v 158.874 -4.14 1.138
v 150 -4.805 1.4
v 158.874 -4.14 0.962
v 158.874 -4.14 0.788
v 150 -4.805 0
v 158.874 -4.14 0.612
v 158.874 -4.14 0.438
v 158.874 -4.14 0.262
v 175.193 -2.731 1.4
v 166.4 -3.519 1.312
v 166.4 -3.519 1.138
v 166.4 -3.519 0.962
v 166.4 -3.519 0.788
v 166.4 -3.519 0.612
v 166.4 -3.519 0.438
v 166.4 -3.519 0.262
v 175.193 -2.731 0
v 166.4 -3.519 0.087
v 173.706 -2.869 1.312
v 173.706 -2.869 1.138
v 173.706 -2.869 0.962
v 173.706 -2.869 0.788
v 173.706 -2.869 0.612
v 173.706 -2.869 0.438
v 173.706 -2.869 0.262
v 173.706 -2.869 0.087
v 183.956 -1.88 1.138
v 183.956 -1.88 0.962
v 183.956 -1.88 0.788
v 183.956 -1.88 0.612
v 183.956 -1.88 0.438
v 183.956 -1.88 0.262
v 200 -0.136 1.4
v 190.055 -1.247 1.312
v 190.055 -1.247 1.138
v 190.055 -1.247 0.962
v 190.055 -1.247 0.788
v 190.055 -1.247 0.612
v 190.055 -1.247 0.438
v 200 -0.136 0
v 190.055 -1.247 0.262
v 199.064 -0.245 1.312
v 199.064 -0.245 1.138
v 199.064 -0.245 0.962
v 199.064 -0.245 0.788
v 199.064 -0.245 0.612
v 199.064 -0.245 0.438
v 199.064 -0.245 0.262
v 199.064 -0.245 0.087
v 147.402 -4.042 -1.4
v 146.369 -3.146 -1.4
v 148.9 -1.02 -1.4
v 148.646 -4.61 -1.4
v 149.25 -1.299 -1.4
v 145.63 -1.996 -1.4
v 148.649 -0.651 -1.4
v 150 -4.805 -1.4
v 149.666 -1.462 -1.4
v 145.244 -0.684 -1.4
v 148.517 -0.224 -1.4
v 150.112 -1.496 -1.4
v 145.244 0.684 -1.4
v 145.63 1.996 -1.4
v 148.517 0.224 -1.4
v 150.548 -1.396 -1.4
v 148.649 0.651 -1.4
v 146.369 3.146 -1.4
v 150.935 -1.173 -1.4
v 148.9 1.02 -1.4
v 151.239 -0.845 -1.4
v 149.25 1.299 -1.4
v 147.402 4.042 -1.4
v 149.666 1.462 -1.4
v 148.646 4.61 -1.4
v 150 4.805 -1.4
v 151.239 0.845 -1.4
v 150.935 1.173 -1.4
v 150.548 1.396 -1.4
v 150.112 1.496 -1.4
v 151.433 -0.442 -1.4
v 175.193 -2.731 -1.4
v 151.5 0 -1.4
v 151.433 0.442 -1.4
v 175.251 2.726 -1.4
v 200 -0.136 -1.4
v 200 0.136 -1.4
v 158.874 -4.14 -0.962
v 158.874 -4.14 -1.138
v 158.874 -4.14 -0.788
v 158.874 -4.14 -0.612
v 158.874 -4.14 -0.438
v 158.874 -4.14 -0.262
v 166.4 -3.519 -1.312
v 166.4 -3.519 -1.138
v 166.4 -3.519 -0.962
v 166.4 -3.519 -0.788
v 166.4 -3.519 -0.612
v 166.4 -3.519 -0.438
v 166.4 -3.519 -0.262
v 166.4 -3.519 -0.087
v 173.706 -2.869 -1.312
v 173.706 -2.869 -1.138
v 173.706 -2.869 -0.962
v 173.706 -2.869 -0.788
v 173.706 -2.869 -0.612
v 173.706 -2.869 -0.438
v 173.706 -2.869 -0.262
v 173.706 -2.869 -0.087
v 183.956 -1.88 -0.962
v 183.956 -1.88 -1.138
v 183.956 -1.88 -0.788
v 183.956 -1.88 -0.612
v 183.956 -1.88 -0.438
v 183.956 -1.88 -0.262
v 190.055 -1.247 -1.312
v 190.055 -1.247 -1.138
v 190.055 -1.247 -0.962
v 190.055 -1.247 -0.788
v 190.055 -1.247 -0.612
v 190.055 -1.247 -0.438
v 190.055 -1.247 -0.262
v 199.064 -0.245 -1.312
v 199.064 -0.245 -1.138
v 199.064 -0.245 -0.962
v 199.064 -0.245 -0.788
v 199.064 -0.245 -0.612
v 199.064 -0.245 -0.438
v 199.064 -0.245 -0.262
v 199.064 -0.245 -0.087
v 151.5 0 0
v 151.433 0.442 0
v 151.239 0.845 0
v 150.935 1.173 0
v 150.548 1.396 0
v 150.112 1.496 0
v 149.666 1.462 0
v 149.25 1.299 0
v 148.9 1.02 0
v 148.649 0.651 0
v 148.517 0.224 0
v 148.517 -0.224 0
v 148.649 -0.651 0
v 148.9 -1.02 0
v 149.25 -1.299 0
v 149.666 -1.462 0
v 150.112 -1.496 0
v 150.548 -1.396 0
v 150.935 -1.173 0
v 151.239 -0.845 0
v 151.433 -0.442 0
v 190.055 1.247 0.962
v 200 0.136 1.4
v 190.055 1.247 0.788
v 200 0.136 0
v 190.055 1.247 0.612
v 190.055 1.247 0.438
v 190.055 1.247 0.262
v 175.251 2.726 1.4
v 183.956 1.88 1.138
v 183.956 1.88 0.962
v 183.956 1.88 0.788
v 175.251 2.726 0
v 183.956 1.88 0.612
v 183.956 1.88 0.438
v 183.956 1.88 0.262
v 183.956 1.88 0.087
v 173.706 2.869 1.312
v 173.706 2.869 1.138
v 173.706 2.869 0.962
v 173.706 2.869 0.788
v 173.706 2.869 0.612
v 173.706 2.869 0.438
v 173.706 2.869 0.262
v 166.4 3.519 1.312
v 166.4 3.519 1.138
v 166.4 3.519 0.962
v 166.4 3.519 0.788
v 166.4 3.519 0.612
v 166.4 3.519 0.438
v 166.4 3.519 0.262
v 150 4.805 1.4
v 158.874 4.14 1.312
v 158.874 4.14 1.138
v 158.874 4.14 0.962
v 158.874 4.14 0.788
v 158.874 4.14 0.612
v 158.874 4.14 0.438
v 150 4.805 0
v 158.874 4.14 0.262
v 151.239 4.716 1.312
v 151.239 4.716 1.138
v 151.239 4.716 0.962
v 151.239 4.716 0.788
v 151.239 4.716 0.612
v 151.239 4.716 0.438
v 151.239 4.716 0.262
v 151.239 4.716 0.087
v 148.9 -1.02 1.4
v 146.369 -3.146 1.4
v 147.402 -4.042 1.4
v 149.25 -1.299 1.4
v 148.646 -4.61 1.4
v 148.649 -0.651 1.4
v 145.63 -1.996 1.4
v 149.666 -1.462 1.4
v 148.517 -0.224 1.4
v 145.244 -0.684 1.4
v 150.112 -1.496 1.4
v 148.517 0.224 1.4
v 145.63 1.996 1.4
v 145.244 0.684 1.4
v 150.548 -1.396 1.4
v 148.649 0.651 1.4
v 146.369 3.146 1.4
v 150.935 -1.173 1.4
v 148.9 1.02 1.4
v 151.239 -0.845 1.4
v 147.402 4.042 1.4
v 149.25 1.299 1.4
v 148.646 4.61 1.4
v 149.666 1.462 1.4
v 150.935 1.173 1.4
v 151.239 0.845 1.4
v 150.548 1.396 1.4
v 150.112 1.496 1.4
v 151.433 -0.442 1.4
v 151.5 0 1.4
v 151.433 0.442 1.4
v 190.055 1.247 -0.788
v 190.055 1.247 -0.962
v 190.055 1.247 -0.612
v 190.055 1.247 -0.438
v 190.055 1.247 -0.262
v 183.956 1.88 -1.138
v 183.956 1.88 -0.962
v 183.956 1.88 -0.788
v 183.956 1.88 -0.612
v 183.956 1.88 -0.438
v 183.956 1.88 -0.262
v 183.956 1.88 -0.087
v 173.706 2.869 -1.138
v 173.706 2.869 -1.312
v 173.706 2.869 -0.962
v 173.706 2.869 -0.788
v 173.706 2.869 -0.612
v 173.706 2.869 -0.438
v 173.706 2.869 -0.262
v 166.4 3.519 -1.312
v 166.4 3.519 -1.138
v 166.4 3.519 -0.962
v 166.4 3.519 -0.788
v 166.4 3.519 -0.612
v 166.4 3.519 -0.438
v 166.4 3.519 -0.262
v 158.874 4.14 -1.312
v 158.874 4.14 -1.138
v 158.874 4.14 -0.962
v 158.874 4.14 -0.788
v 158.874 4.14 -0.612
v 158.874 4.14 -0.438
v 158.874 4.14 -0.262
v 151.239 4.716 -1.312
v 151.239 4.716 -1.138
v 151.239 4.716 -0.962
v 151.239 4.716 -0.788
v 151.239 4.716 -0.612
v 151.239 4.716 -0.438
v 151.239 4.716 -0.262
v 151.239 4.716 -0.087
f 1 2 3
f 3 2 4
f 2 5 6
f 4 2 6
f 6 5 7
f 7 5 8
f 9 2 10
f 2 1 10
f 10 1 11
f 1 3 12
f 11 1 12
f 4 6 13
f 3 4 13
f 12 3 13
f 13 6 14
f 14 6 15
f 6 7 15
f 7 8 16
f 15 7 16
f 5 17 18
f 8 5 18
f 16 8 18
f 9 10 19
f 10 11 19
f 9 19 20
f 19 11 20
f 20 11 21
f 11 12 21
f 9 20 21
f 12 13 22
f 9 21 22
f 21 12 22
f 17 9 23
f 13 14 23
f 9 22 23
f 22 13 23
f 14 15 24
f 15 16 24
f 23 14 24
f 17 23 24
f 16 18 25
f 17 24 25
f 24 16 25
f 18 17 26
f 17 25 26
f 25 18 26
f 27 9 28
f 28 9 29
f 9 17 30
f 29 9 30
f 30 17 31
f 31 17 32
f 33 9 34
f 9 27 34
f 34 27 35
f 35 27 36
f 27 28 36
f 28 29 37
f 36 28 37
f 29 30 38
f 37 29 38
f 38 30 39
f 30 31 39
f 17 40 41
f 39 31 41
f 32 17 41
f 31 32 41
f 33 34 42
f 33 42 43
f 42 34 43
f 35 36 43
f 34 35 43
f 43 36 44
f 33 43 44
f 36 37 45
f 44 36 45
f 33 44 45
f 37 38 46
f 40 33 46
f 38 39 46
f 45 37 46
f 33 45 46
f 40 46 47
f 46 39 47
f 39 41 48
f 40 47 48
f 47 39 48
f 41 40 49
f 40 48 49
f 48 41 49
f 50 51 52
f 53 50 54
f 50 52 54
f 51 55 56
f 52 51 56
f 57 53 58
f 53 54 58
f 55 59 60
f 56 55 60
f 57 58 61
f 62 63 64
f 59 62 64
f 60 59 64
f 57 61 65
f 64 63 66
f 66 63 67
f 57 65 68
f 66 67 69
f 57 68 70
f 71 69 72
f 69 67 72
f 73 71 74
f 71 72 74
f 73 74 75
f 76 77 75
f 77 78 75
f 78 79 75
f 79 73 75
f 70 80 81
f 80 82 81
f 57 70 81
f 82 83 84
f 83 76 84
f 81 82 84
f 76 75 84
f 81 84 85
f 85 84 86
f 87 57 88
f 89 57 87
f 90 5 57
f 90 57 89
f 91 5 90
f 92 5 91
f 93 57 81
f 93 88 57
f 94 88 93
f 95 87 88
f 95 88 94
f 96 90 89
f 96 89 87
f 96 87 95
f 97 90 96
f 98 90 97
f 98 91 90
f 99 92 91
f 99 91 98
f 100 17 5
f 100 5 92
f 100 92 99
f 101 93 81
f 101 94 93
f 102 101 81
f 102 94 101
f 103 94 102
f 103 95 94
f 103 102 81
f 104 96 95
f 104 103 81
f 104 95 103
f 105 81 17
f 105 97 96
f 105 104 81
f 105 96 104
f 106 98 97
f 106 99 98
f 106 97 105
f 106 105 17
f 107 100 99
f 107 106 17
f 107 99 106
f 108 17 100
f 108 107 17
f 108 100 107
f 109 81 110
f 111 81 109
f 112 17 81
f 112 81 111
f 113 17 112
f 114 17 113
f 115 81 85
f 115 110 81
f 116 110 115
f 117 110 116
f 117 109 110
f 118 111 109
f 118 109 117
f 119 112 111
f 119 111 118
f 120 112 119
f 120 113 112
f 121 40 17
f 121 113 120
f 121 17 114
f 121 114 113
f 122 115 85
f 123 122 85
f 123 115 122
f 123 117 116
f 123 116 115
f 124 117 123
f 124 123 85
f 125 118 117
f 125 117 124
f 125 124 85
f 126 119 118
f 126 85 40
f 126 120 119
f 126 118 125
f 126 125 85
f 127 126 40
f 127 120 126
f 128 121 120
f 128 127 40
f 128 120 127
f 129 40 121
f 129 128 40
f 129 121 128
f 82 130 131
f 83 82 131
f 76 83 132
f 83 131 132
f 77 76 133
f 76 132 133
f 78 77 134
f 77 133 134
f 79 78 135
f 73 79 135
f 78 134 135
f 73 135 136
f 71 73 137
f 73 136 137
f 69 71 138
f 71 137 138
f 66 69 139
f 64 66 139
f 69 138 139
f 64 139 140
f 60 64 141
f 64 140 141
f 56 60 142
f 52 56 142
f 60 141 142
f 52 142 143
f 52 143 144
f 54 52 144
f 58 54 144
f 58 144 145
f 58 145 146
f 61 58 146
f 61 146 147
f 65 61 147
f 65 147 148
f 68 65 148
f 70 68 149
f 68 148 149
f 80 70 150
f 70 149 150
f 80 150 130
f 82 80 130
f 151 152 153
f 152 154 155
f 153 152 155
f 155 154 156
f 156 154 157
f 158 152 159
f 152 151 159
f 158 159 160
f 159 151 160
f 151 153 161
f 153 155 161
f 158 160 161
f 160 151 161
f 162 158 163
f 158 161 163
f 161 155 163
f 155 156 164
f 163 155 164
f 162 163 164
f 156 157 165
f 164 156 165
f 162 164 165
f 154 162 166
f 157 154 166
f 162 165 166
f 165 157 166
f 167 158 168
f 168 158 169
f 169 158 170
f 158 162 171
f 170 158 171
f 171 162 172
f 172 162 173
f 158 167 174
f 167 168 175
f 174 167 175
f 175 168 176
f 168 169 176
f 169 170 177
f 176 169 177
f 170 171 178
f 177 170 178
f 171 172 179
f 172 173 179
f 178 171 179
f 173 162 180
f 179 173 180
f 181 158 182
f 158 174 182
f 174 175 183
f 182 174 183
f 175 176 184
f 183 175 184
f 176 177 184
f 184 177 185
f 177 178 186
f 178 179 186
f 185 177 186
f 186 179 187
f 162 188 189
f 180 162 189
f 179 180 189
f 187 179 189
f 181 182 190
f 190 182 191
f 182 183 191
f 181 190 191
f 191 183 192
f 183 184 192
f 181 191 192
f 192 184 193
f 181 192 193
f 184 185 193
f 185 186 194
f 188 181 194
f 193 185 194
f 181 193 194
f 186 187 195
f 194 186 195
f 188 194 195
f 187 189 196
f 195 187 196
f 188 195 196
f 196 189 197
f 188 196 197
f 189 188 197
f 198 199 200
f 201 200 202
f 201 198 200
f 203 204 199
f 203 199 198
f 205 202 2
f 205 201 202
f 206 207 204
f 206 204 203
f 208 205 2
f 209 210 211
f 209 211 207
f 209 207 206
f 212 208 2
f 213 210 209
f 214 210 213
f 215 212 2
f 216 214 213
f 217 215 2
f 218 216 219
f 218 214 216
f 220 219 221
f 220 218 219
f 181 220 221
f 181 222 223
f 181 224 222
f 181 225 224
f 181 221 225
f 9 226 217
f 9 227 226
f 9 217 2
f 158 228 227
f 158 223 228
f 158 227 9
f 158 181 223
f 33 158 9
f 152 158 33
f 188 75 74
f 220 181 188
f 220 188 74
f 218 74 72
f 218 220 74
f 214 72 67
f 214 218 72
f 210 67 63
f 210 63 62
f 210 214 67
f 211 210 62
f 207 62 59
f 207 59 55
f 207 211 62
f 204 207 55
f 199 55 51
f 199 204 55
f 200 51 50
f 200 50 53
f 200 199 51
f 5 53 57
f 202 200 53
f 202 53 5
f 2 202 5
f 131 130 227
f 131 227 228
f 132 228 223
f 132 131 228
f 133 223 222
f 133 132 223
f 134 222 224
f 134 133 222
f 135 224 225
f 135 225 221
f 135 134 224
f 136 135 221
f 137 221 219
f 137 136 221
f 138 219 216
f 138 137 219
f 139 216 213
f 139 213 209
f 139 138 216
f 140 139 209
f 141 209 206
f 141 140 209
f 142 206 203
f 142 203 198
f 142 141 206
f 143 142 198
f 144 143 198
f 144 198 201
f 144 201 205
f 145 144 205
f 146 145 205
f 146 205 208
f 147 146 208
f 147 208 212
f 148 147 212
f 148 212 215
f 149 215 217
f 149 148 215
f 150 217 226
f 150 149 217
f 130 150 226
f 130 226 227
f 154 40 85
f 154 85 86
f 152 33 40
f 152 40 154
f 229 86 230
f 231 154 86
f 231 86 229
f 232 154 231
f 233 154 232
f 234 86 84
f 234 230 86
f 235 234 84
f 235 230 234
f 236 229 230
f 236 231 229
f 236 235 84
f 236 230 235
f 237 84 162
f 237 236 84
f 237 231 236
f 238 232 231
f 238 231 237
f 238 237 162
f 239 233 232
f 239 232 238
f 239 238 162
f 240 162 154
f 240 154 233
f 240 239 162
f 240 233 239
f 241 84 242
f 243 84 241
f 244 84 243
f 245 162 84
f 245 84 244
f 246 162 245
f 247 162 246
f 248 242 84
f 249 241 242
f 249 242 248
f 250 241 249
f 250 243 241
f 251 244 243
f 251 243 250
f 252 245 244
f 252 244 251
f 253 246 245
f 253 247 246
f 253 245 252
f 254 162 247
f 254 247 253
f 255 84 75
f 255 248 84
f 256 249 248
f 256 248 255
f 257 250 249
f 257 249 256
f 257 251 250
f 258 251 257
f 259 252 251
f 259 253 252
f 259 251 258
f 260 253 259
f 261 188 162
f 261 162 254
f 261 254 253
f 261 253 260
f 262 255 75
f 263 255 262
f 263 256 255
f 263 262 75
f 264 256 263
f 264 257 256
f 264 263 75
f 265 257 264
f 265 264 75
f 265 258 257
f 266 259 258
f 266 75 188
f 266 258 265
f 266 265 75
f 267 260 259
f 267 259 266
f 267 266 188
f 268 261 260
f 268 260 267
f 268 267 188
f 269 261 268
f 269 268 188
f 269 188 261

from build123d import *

# Parameters (mm, degrees)
SKETCH_1_R      = 1.5
EXTRUDE_1_DEPTH = 1.4


with BuildPart() as part:
    # Эскиз1 → Бобышка-Вытянуть1 (new, symmetric)
    with BuildSketch(Plane.XY):
        with BuildLine():
            Line((200, -0.1365), (200, 0.1365))
            add(Edge.make_bspline(
                [(200, 0.1365), (199.68803342, 0.172881569), (198.81669122, 0.27449757), (197.235914613, 0.456098486), (195.145010046, 0.692291497), (192.701519493, 0.962451868), (189.981579718, 1.256111468), (187.036509642, 1.566007991), (183.904963565, 1.886673282), (179.441732645, 2.330723386), (174.819068239, 2.769921708), (170.064960651, 3.20022732), (166.382173561, 3.522091337), (162.644406173, 3.836797902), (158.865943793, 4.14237985), (155.059961592, 4.437010481), (152.101523013, 4.655245952), (150.413140573, 4.775462142), (150, 4.804613846)],
                knots=[0, 0, 0, 0, 0.007144724, 0.019955661, 0.036196061, 0.055011184, 0.075878938, 0.098428866, 0.122375554, 0.147487885, 0.200459747, 0.22800517, 0.256076454, 0.284555151, 0.313332763, 0.342309554, 0.371392651, 0.380814152, 0.380814152, 0.380814152, 0.380814152], degree=3))
            ThreePointArc((150, 4.804613846), (145.195386154, 0), (150, -4.804613846))
            add(Edge.make_bspline(
                [(150, -4.804613846), (150.413140573, -4.775462142), (152.101523013, -4.655245952), (155.059961592, -4.437010481), (158.865943793, -4.14237985), (162.644406173, -3.836797902), (166.382173561, -3.522091337), (170.064960651, -3.20022732), (174.819068239, -2.769921708), (179.441732645, -2.330723386), (183.904963565, -1.886673282), (187.036509642, -1.566007991), (189.981579718, -1.256111468), (192.701519493, -0.962451868), (195.145010046, -0.692291497), (197.235914613, -0.456098486), (198.81669122, -0.27449757), (199.68803342, -0.172881569), (200, -0.1365)],
                knots=[0.619185848, 0.619185848, 0.619185848, 0.619185848, 0.628607349, 0.657690446, 0.686667237, 0.715444849, 0.743923546, 0.77199483, 0.799540253, 0.852512115, 0.877624446, 0.901571134, 0.924121062, 0.944988816, 0.963803939, 0.980044339, 0.992855276, 1, 1, 1, 1], degree=3))
        make_face()
        with Locations((150, 0)):
            Circle(SKETCH_1_R, mode=Mode.SUBTRACT)
    extrude(amount=EXTRUDE_1_DEPTH, both=True)


solid = part.part
